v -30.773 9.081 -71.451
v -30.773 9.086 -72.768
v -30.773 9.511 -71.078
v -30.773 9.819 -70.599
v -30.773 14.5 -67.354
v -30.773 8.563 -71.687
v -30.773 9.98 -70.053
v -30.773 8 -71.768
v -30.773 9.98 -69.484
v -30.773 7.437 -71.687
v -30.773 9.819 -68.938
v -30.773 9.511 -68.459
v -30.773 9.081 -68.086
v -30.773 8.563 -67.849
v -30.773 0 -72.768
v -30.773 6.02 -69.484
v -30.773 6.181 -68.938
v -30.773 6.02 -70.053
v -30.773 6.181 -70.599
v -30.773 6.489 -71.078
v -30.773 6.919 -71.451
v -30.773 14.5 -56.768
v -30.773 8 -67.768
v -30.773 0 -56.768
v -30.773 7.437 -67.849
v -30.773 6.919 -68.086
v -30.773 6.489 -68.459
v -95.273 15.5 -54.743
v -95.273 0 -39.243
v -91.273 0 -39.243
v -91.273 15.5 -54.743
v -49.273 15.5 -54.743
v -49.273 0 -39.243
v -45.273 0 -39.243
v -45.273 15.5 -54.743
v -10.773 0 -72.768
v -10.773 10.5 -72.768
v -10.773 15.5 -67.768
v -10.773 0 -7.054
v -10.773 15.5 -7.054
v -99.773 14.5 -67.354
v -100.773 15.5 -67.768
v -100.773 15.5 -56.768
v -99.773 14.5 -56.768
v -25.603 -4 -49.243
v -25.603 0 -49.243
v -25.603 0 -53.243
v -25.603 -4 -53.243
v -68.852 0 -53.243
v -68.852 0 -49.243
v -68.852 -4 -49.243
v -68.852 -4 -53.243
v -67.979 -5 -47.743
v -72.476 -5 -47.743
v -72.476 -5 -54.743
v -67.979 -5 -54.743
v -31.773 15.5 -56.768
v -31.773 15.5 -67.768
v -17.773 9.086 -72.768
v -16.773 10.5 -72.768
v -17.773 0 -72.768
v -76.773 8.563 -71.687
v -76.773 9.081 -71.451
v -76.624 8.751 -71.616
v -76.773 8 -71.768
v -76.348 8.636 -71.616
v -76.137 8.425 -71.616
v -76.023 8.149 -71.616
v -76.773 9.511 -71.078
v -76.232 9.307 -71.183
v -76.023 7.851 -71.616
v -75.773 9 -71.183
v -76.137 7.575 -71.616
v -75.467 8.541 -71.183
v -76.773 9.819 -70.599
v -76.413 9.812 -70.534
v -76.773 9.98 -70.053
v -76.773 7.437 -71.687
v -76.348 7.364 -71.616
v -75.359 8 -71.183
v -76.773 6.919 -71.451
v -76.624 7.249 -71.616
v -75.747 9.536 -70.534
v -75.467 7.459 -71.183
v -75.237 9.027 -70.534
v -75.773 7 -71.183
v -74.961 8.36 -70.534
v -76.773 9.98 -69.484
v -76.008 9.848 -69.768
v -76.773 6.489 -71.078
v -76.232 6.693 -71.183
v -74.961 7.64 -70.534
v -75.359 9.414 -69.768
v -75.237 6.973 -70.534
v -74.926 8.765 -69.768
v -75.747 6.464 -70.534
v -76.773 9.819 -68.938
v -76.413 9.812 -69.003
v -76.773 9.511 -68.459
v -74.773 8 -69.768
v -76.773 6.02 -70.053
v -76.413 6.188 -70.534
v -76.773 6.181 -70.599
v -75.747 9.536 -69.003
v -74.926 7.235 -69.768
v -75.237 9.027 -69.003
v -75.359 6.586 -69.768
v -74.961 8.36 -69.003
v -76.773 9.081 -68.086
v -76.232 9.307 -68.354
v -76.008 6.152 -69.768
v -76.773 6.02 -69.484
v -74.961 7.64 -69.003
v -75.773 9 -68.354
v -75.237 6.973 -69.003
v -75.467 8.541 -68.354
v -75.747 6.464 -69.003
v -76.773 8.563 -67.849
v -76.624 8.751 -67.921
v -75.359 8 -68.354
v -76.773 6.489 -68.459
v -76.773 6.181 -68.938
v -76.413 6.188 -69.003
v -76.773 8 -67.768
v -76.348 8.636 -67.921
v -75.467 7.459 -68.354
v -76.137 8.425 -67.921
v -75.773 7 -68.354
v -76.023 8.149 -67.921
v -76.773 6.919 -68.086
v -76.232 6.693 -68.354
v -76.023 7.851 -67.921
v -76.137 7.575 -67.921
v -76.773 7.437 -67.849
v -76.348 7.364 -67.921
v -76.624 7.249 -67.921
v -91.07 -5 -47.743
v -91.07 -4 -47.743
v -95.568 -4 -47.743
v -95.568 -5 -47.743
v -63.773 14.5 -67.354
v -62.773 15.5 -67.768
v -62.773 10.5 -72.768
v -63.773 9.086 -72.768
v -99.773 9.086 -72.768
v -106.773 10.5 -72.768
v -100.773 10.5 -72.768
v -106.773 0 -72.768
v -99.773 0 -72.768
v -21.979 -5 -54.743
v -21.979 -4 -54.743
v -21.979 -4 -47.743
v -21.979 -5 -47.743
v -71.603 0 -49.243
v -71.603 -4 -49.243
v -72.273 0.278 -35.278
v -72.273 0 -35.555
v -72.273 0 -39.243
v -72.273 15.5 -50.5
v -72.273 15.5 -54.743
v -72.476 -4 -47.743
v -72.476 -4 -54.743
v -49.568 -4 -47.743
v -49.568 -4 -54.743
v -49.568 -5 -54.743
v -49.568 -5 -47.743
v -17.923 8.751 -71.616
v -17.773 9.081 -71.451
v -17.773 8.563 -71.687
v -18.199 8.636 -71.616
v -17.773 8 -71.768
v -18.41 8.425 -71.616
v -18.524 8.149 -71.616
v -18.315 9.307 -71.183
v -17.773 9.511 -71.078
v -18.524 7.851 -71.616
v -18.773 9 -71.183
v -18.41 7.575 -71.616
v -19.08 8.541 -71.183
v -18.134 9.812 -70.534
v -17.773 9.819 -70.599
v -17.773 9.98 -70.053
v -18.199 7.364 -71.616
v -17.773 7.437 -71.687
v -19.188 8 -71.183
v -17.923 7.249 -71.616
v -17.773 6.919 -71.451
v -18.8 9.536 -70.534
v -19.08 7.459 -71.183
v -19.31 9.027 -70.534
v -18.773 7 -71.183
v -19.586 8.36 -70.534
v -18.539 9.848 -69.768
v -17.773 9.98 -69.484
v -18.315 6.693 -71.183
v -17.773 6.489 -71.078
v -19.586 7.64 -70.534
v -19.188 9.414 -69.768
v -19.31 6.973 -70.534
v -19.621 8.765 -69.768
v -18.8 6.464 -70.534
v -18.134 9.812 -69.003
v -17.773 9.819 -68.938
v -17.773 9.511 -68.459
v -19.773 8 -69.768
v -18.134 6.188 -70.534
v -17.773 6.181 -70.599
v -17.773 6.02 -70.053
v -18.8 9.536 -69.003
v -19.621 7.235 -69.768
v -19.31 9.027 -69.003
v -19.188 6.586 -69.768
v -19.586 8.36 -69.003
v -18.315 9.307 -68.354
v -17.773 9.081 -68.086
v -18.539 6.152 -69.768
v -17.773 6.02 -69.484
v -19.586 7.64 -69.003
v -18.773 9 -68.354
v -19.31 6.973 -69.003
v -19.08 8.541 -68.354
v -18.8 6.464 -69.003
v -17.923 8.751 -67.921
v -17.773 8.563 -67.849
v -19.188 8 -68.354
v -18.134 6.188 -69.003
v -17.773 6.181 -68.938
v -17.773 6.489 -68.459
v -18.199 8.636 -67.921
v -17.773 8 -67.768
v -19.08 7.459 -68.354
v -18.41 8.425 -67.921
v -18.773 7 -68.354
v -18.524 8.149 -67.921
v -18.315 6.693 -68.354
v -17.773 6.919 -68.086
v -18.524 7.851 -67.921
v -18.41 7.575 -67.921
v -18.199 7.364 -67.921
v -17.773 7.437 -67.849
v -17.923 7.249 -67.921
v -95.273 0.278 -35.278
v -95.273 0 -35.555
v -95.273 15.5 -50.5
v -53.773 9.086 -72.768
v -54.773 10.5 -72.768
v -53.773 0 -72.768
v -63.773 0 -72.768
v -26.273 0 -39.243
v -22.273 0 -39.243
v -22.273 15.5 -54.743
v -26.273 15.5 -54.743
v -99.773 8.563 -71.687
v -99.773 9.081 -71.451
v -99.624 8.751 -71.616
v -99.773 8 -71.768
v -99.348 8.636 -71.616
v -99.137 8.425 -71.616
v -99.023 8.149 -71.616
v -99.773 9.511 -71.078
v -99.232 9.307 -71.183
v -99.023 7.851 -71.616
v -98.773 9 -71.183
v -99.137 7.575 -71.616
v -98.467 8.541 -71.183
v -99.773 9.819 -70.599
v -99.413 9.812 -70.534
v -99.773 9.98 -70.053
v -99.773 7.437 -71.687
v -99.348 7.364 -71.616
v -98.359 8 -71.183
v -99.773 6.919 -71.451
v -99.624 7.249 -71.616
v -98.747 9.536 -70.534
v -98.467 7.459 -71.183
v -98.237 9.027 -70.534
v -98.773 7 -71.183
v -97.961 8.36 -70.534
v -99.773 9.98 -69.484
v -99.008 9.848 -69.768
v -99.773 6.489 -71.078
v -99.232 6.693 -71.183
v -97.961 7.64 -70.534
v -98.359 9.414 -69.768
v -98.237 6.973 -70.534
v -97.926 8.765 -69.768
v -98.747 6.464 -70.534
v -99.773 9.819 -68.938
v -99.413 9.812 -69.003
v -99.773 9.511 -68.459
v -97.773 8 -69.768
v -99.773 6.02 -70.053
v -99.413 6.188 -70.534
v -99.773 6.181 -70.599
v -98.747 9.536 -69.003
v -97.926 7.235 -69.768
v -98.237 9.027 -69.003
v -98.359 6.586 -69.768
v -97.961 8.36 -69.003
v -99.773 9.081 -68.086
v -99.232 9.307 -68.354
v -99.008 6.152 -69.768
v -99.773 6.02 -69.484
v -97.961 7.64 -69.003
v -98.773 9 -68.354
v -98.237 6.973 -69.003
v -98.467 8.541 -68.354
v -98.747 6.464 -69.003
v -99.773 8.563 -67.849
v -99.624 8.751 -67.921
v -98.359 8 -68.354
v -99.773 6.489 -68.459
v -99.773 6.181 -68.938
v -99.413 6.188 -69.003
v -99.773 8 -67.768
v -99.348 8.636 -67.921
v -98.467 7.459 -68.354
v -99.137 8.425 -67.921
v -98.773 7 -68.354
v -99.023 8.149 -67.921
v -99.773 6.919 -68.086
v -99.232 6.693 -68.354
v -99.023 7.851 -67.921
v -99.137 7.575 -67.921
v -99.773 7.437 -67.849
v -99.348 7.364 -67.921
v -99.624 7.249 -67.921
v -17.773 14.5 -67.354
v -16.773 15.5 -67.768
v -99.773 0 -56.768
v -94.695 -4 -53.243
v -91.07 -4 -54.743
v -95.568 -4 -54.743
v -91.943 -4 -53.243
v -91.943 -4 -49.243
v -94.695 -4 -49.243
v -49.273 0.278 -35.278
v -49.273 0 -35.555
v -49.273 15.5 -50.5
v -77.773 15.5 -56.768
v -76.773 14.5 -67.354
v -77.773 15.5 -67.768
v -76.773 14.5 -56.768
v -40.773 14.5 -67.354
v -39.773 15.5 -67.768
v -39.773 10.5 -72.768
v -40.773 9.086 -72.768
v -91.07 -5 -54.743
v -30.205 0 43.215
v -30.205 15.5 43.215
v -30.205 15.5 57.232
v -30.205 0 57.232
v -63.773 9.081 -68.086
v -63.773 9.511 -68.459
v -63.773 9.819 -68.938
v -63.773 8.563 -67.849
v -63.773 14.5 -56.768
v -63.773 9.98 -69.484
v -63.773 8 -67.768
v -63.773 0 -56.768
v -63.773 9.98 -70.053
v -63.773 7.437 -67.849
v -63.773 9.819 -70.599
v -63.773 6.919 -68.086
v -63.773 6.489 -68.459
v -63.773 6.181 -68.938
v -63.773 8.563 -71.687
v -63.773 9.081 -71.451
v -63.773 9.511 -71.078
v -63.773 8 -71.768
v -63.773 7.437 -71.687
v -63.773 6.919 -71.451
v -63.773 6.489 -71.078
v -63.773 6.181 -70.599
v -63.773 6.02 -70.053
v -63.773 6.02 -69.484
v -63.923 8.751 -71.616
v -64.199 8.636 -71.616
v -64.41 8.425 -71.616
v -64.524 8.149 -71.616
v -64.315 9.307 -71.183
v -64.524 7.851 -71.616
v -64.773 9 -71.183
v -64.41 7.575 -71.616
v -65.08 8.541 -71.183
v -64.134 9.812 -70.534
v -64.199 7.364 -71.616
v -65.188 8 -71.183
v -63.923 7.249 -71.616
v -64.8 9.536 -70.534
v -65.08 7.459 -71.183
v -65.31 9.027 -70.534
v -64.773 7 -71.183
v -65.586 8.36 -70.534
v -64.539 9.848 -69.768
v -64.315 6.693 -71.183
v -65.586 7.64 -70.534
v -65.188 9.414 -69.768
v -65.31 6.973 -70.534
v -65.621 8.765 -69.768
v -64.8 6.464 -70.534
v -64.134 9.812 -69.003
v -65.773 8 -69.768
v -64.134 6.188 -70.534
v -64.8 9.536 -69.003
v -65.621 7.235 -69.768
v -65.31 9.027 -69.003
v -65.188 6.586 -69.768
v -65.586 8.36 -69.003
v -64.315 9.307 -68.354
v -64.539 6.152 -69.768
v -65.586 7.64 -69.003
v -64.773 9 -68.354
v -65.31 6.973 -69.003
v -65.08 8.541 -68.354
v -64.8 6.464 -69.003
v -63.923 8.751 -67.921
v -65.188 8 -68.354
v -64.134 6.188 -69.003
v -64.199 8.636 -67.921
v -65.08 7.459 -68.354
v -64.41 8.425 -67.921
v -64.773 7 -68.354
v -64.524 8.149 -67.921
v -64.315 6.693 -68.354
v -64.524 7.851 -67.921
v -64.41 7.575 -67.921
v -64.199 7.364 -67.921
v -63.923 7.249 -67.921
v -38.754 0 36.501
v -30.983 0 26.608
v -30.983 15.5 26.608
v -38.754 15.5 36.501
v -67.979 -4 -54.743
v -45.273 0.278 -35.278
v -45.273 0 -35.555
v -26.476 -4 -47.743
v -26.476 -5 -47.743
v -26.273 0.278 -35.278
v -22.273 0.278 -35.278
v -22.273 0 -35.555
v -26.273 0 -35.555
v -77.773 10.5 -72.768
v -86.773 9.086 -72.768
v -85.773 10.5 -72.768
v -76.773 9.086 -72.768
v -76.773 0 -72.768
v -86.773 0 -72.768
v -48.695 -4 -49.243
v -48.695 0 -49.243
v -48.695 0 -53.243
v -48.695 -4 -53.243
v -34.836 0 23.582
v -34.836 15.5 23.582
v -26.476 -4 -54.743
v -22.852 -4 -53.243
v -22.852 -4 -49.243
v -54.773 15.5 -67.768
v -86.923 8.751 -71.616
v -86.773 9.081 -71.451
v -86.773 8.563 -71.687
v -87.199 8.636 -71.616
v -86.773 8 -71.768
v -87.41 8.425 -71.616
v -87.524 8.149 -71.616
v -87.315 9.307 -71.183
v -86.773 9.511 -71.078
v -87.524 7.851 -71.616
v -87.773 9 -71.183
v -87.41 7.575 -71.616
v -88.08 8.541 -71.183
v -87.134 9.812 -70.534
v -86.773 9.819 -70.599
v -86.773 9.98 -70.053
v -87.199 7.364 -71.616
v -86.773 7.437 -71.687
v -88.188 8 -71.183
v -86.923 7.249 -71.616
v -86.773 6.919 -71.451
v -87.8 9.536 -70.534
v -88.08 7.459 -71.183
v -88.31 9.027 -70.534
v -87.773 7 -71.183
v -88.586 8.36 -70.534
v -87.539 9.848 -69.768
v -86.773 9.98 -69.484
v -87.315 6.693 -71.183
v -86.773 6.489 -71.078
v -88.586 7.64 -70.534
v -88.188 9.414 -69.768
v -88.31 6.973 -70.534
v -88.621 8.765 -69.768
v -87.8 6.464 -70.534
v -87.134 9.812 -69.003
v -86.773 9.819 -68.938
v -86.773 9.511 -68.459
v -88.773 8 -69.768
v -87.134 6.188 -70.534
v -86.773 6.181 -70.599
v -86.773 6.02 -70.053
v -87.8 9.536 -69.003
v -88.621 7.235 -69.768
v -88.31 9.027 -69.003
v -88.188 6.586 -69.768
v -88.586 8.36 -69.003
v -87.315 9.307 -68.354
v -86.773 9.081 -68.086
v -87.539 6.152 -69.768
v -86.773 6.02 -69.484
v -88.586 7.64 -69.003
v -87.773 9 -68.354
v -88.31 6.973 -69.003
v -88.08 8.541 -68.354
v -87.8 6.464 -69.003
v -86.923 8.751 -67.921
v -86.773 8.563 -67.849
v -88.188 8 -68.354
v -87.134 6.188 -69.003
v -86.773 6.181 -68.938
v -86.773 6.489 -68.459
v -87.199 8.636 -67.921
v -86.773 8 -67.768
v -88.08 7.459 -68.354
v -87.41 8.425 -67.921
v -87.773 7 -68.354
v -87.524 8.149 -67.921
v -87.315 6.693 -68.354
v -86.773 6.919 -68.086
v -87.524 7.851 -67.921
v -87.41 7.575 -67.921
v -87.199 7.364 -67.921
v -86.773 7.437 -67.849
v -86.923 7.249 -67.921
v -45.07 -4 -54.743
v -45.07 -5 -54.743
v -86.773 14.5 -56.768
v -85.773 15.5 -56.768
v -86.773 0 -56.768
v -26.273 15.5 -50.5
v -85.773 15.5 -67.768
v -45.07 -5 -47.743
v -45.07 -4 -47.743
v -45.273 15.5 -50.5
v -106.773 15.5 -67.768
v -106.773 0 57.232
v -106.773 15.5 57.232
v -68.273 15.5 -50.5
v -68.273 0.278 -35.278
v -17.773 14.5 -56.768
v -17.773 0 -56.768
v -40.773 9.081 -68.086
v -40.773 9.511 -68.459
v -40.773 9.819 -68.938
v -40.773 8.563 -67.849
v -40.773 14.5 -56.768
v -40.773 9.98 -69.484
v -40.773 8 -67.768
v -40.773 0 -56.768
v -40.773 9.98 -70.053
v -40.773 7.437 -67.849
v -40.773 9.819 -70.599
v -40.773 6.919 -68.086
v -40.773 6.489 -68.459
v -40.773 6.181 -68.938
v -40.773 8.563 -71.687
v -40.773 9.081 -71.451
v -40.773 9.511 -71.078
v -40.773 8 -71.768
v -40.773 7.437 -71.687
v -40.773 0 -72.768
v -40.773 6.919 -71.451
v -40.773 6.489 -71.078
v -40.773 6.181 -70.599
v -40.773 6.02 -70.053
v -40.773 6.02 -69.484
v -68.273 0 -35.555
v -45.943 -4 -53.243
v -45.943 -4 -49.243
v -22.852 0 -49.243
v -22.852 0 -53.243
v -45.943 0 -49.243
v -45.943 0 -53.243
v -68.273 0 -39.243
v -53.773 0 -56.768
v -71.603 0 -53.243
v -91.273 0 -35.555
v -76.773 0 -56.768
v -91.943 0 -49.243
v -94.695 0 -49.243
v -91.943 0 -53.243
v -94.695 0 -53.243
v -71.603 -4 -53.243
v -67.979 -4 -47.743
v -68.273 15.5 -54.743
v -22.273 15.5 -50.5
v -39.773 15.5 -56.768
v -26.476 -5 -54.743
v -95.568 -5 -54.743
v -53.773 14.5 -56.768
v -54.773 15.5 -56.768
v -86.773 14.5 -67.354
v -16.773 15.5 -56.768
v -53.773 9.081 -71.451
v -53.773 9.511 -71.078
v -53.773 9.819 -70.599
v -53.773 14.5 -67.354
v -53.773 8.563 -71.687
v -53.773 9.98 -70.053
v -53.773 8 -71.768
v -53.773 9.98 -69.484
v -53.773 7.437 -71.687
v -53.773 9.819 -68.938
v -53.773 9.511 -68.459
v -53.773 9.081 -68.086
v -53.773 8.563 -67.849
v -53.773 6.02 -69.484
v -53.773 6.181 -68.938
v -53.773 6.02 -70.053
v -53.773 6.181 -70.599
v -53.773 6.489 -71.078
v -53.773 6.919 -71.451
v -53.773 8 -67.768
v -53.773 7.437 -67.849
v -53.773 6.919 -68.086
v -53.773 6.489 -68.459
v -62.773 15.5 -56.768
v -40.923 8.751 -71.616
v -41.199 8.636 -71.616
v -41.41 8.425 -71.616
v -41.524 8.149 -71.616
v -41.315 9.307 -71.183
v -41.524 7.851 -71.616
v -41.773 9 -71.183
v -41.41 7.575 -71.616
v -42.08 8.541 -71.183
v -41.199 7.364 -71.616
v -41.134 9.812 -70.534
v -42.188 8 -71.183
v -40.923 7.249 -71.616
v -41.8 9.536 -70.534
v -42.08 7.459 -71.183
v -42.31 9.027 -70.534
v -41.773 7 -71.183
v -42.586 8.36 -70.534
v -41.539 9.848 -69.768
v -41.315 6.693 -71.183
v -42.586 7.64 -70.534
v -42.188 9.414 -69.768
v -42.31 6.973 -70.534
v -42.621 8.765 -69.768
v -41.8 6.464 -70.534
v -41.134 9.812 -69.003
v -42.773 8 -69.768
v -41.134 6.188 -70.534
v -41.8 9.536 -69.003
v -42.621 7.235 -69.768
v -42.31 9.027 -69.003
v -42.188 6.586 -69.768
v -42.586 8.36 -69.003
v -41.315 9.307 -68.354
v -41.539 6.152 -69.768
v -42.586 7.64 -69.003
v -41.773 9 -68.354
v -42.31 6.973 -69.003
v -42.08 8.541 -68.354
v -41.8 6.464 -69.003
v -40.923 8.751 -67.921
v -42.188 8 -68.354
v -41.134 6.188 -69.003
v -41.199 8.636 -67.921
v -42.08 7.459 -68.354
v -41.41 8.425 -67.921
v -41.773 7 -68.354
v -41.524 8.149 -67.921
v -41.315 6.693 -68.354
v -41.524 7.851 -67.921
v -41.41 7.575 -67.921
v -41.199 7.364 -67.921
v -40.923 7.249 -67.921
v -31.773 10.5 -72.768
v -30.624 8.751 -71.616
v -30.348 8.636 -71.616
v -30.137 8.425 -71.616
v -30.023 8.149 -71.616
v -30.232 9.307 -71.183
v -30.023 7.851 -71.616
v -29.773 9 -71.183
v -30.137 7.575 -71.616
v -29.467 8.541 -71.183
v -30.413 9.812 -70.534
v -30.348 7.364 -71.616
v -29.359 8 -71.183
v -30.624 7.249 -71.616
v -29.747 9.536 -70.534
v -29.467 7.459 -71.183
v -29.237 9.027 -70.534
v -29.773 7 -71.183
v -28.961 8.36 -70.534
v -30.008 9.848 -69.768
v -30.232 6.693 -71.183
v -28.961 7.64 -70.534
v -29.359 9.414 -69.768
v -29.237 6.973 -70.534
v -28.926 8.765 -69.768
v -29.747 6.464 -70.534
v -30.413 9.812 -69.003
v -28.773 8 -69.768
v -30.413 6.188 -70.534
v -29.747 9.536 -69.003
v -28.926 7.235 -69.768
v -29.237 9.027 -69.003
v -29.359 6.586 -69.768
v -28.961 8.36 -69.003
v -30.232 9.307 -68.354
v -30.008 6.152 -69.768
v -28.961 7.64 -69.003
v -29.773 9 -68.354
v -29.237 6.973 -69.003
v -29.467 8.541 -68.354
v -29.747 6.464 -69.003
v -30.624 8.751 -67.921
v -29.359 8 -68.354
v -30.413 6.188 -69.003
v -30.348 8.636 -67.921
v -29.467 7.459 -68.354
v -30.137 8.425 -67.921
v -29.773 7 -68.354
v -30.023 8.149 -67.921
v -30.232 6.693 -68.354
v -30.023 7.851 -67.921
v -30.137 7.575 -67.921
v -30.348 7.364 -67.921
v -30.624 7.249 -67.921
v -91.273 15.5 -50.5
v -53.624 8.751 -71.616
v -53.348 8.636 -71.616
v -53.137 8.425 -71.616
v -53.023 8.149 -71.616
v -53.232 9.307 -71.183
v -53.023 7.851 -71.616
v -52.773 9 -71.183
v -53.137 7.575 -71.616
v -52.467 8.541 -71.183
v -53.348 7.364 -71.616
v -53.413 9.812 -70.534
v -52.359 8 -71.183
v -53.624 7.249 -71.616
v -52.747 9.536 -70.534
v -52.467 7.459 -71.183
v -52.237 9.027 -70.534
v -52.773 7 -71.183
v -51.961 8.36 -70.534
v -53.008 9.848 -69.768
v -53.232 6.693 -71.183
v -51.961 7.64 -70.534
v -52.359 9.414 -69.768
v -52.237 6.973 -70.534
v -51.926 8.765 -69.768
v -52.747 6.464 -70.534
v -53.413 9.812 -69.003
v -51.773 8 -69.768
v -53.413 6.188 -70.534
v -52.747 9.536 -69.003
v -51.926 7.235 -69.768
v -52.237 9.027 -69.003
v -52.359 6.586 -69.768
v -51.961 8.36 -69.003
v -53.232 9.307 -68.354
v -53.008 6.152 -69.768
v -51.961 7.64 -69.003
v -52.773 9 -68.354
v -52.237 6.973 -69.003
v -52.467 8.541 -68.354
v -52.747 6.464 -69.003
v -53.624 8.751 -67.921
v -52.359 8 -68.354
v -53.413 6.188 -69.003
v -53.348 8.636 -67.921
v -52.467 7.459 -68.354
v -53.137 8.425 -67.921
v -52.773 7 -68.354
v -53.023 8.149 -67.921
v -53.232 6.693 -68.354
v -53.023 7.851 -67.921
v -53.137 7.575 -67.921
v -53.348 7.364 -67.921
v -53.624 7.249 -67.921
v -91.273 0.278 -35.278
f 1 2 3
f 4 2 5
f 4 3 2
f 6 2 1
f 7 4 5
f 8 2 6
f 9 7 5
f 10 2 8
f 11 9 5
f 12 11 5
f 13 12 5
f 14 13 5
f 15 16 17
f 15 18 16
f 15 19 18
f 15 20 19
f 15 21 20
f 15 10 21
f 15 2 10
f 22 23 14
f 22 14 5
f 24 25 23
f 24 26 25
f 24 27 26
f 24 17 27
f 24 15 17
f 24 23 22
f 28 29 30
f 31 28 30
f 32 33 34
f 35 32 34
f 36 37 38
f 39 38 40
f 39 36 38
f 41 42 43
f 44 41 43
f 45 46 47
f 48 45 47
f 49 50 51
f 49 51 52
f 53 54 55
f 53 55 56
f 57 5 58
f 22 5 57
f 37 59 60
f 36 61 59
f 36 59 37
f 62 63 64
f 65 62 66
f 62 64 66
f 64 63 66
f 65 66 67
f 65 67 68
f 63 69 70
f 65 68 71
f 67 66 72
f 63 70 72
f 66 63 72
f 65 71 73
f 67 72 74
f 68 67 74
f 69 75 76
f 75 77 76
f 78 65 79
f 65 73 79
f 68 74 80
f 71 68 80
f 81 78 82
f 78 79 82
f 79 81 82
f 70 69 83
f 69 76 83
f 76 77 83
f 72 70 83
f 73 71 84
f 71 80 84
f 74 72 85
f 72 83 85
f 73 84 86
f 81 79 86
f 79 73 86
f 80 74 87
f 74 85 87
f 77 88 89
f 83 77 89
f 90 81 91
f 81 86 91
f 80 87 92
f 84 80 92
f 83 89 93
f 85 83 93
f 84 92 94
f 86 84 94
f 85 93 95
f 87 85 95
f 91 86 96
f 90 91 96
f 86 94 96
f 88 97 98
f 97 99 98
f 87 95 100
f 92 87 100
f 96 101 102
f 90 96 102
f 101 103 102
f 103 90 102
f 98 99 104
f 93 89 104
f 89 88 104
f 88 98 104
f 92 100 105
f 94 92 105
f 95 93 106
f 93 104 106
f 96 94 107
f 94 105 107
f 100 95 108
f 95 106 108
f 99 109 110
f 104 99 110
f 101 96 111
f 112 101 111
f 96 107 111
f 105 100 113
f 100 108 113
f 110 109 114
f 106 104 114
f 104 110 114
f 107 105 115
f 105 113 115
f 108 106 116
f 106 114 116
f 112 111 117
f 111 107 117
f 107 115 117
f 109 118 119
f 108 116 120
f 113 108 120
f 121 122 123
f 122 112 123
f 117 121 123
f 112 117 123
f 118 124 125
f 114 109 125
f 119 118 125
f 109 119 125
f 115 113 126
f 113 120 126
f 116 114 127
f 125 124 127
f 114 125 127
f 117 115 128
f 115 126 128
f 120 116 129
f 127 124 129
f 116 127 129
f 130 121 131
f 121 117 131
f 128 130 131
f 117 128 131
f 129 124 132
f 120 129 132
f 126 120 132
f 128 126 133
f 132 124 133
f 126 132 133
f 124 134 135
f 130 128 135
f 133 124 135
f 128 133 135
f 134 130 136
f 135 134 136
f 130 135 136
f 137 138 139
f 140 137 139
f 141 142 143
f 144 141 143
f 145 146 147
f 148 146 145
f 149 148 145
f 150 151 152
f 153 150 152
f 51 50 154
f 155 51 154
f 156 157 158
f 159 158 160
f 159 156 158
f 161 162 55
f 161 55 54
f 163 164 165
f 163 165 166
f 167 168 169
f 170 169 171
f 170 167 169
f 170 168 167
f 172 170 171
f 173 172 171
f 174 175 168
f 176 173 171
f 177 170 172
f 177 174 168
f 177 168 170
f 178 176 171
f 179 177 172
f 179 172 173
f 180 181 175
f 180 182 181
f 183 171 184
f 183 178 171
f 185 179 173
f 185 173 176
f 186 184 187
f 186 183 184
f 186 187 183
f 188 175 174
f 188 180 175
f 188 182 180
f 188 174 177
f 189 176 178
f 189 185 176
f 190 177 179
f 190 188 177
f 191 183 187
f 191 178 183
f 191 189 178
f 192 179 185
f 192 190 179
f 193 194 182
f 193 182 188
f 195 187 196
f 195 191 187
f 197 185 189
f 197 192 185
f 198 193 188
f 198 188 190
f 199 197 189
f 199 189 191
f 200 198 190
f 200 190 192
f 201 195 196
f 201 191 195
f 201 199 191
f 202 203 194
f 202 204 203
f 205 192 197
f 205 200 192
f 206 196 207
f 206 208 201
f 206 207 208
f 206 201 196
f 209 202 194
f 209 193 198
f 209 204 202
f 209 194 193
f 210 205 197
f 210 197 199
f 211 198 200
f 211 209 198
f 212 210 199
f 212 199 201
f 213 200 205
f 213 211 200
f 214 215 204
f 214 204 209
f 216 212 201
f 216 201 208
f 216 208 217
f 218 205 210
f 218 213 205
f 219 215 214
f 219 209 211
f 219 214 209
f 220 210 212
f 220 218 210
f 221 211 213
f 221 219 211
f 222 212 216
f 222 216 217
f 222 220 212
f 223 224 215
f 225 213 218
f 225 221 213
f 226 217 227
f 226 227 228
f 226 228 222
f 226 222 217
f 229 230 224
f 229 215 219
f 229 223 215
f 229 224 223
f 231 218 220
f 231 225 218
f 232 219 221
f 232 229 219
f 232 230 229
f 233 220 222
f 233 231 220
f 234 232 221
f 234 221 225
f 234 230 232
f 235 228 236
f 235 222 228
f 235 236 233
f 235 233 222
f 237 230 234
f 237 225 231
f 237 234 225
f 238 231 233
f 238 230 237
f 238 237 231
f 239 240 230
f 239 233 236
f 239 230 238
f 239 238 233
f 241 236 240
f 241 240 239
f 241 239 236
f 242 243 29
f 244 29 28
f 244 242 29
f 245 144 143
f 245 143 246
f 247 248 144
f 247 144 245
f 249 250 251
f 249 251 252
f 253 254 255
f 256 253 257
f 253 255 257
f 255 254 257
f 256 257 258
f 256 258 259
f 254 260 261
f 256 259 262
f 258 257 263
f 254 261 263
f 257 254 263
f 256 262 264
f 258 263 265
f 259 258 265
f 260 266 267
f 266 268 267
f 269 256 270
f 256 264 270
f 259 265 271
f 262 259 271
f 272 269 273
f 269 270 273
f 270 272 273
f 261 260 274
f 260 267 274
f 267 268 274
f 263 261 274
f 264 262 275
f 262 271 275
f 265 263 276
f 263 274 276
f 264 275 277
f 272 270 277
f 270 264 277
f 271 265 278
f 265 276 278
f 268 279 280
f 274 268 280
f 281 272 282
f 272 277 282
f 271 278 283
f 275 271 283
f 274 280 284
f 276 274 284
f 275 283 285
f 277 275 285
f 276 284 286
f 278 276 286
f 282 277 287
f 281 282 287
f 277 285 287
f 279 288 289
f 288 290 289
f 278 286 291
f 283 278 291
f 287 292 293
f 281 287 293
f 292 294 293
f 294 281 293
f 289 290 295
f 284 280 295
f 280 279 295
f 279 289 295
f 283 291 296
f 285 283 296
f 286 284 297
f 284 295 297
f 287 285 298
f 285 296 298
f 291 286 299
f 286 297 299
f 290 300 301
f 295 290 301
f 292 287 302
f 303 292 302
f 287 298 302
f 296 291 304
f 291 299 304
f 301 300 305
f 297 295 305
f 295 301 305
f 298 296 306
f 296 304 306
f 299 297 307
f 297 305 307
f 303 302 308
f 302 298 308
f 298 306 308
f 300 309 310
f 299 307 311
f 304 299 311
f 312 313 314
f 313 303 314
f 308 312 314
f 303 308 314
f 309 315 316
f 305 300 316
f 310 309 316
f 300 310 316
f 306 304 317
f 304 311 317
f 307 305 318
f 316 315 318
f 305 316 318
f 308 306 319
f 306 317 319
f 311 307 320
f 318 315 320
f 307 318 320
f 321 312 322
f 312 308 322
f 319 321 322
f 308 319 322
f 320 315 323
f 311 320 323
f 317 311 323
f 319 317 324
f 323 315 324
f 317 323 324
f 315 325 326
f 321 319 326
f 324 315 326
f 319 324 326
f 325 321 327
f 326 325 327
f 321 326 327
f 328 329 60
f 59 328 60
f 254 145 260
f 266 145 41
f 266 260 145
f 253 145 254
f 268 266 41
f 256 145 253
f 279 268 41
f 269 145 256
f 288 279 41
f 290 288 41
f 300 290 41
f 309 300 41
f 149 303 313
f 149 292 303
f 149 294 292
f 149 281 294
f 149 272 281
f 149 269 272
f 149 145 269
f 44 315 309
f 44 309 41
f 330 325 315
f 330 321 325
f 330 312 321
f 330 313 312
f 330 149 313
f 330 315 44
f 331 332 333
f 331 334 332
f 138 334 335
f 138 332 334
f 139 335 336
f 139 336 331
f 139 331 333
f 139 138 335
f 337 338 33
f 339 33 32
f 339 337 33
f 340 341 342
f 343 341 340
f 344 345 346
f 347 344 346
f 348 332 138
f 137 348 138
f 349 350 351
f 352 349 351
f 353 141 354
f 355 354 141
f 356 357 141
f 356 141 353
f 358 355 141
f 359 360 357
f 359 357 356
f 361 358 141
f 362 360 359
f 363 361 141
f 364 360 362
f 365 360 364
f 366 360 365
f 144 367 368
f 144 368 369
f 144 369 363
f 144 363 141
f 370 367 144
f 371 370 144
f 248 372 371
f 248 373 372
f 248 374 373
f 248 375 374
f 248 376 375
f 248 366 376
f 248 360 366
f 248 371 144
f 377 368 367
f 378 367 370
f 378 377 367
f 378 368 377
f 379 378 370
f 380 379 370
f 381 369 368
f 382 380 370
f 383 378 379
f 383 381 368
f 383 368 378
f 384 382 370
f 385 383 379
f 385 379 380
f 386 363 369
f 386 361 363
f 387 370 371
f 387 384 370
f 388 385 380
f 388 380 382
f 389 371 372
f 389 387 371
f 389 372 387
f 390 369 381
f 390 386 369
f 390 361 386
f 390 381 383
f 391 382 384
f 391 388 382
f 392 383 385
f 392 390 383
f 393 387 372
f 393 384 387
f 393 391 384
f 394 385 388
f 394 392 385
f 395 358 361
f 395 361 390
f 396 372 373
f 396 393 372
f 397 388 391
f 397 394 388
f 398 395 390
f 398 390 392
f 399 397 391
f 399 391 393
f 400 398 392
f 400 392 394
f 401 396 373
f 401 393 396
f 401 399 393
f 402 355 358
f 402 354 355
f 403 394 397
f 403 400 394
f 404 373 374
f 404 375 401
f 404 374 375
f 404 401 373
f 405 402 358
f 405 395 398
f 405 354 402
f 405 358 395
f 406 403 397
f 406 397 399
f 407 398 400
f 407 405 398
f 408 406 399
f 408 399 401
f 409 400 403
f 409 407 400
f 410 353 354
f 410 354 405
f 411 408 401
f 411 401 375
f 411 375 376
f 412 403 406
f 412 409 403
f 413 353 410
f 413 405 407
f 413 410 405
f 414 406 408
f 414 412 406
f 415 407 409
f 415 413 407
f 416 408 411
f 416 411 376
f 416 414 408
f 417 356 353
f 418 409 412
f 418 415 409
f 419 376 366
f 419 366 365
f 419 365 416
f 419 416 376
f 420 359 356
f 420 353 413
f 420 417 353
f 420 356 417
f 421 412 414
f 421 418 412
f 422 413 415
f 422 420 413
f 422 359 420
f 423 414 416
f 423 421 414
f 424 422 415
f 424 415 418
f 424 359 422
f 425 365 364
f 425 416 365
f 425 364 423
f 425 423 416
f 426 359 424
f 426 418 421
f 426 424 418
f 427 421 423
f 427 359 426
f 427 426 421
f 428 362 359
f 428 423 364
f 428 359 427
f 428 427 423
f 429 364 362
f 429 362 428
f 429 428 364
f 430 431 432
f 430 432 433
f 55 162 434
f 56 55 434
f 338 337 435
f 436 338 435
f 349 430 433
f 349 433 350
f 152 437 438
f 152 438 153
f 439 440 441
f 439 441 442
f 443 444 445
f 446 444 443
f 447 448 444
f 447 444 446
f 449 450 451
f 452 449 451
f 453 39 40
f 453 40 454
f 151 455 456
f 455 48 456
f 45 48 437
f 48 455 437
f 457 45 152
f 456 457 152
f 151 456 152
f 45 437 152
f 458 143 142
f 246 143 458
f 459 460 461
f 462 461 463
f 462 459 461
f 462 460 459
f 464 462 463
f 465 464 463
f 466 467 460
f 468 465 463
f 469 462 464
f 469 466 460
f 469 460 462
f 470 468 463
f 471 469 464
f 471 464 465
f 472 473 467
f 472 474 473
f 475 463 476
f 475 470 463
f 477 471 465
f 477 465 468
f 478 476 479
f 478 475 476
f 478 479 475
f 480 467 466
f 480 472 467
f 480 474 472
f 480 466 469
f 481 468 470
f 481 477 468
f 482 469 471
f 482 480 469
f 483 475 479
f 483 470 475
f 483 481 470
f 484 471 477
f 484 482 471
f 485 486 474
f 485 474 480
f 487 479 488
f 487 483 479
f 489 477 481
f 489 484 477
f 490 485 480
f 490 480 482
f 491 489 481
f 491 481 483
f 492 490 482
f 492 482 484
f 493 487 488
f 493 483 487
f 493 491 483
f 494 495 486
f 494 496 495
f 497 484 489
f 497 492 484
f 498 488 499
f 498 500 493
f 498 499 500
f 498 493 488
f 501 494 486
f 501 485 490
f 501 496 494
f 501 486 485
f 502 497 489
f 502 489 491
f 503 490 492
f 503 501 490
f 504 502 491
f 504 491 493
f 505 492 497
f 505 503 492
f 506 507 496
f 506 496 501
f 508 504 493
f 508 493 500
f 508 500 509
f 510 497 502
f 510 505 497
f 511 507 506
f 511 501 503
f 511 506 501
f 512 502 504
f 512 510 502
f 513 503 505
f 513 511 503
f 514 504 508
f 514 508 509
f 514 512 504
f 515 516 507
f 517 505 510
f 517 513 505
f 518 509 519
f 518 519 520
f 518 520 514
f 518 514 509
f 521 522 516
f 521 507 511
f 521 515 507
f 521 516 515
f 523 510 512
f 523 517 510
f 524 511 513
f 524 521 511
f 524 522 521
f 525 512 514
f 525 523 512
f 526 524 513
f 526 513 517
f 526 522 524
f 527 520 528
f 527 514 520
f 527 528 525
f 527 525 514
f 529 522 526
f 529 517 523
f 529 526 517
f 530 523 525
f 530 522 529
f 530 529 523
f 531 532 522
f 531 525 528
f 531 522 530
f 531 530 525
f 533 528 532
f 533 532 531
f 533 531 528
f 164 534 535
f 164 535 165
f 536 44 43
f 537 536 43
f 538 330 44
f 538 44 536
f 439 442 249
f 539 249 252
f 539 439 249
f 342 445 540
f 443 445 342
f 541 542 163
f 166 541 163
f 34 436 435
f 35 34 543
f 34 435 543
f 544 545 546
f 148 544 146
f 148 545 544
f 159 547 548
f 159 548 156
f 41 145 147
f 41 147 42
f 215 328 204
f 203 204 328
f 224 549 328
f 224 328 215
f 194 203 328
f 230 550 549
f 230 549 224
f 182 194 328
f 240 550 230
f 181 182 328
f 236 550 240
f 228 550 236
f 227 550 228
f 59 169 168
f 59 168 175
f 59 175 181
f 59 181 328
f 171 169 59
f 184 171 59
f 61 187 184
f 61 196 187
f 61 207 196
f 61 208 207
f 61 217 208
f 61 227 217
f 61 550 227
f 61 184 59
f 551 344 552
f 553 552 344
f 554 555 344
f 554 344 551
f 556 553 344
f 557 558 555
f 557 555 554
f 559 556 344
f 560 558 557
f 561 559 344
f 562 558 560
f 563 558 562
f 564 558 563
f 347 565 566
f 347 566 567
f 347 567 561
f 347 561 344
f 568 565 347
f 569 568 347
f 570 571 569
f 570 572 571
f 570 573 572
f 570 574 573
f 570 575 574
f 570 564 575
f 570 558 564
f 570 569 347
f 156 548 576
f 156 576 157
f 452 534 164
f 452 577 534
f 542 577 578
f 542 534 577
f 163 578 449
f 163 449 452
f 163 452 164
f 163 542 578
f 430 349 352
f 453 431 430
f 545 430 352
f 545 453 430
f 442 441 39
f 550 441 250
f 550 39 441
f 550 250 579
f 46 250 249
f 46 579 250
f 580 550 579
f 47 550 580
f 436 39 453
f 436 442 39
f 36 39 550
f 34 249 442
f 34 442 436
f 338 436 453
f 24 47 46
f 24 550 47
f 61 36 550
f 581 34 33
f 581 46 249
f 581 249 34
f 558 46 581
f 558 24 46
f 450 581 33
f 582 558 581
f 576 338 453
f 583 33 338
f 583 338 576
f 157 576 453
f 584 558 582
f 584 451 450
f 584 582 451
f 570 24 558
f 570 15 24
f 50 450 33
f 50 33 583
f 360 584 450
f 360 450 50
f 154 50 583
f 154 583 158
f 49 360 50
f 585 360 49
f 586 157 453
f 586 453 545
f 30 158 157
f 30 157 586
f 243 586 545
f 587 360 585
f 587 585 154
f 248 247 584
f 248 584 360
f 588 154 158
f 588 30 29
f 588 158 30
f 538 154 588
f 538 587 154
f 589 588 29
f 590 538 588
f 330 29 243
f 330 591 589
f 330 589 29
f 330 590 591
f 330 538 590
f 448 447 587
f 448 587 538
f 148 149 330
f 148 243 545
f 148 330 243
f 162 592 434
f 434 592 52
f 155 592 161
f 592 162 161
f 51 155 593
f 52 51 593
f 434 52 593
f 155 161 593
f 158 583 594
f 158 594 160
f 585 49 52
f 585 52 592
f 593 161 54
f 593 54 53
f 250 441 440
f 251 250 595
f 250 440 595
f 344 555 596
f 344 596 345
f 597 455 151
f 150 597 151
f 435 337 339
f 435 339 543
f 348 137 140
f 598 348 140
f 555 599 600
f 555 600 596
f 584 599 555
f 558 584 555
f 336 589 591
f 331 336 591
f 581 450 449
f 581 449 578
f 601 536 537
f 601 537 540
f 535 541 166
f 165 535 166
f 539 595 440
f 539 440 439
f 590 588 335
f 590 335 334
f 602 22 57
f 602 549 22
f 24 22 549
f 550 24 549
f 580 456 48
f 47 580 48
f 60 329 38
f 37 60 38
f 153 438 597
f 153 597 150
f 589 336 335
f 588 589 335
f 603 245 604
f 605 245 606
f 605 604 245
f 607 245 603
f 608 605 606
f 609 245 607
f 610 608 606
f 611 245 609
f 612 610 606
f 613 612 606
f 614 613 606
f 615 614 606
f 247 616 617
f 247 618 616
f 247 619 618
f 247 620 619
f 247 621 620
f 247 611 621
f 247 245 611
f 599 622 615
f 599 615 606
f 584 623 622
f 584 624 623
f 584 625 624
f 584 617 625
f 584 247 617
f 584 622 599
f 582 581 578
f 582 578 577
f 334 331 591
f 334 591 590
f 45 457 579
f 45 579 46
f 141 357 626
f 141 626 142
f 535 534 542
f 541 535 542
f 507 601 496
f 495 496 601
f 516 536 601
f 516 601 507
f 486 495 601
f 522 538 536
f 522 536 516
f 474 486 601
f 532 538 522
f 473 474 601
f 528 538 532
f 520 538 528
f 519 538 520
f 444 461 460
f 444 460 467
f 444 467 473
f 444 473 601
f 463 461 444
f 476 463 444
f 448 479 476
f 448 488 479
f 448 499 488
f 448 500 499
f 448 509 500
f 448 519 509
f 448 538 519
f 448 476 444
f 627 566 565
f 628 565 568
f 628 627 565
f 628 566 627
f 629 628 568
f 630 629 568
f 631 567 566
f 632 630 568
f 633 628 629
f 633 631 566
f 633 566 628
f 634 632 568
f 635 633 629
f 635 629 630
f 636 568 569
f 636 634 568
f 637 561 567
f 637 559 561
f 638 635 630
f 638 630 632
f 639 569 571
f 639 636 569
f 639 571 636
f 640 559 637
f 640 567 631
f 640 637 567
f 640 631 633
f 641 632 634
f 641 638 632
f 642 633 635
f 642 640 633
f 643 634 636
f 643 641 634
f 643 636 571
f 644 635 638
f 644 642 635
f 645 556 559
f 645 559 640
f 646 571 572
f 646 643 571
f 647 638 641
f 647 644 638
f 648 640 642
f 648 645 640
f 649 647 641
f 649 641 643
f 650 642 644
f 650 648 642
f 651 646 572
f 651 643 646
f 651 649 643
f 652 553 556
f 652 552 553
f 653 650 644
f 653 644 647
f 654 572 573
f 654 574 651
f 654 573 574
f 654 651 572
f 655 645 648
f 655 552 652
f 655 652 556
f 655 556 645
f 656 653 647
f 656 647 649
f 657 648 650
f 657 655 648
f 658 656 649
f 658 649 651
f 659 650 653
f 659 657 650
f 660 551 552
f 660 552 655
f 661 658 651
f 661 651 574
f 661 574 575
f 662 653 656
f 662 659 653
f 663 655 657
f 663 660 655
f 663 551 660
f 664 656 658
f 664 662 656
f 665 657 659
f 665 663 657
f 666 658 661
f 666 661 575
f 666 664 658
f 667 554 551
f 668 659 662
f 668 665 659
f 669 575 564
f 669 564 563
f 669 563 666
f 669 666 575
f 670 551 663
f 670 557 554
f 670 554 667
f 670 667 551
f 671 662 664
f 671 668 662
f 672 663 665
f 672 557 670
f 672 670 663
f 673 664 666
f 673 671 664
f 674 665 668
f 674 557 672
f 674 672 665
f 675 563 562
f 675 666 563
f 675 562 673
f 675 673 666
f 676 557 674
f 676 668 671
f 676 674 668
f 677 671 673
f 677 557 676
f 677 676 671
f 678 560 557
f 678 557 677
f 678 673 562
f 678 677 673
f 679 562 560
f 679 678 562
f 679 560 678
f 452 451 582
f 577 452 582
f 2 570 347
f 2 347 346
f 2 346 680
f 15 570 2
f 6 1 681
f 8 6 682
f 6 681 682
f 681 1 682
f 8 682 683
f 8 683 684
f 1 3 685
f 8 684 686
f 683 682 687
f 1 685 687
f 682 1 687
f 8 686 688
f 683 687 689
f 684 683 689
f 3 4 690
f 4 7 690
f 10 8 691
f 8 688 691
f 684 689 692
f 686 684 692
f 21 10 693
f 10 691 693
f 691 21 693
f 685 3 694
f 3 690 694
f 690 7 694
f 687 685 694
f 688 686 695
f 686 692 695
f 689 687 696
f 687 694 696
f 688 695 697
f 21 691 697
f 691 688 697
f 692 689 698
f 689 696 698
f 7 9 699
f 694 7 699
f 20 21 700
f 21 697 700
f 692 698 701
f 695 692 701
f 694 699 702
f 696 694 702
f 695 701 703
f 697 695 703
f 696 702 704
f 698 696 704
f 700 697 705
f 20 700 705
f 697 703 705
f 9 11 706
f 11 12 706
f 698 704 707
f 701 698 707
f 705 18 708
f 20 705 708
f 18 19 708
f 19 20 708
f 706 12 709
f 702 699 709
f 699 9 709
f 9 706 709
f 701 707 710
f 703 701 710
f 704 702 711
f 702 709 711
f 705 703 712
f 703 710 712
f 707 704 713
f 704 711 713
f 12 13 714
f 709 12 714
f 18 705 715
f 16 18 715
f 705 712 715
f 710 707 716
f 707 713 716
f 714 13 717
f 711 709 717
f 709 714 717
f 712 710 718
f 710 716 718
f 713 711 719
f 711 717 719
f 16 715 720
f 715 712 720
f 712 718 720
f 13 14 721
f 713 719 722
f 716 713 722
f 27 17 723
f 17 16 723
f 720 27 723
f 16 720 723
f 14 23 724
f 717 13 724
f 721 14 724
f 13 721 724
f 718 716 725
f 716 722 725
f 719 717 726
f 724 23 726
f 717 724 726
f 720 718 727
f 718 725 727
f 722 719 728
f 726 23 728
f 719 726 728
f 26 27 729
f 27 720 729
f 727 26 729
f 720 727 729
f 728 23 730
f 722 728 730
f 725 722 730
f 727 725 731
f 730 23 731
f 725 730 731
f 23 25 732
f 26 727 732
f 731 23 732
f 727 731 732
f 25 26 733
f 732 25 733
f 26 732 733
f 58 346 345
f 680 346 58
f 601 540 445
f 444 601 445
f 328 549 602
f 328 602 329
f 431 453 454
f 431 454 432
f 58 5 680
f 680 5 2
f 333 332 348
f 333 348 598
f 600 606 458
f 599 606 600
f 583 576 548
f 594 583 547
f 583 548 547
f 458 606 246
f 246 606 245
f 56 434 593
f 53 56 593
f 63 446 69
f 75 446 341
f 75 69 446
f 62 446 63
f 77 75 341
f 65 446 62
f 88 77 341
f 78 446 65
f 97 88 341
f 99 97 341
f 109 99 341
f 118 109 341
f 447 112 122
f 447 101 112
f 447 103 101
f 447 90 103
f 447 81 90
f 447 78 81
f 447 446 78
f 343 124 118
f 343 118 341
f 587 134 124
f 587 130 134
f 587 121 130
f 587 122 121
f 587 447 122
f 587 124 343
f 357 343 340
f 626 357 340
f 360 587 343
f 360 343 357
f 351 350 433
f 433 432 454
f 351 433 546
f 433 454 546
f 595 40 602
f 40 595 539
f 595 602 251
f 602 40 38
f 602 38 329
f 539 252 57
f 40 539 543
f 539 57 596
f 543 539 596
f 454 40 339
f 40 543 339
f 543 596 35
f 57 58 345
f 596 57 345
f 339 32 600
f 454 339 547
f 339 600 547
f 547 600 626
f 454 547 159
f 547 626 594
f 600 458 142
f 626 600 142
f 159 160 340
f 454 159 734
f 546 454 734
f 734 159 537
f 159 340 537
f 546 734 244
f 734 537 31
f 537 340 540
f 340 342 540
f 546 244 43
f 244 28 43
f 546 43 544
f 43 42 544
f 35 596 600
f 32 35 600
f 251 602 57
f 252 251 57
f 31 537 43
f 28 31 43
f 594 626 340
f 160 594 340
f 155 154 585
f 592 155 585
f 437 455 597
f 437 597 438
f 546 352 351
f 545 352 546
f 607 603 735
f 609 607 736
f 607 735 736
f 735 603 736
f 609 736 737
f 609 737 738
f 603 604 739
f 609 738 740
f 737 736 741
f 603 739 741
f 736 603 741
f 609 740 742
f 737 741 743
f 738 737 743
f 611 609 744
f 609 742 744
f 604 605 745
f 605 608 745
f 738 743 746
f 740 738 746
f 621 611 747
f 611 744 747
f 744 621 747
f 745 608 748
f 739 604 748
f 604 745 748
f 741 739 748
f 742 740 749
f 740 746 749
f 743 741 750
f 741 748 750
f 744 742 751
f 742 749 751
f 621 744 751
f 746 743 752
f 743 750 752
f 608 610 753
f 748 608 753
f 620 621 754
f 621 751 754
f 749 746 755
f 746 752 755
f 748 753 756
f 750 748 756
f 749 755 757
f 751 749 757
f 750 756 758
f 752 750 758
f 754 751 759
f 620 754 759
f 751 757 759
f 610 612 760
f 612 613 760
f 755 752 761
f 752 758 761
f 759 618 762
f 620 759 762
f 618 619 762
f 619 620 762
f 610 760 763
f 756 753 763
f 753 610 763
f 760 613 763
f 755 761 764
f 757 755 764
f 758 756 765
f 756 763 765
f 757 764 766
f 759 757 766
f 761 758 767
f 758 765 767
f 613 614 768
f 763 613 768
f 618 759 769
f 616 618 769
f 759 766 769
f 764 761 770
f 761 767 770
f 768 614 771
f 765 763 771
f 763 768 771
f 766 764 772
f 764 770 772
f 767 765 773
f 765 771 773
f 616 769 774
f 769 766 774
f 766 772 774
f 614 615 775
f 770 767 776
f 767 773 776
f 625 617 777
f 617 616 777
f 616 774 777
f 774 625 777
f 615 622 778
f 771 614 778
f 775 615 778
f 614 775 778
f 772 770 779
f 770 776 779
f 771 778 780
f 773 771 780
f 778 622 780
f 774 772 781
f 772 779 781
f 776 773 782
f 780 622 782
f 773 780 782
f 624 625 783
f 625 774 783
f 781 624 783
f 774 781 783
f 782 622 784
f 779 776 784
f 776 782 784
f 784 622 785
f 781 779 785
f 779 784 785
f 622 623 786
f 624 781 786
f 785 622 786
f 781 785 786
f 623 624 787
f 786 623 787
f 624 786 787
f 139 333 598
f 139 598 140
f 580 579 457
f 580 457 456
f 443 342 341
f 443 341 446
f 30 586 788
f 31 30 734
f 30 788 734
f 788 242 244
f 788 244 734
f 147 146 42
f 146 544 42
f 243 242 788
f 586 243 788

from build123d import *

# Parameters (mm, degrees)
BOSS_EXTRUDE1_DEPTH     = 15.5
SKETCH10_W              = 4
SKETCH10_H              = 30
CUT_EXTRUDE1_DEPTH      = 3
MIRROR5_COPY_1_SKETCH_W = 4
MIRROR5_COPY_1_SKETCH_H = 30
MIRROR5_COPY_1_DEPTH    = 3
SKETCH14_W              = 2.751713212
SKETCH14_H              = 4
BOSS_EXTRUDE2_DEPTH     = 4
SKETCH15_W              = 4.497862048
SKETCH15_H              = 7
BOSS_EXTRUDE3_DEPTH     = 1
MIRROR7_COPY_1_SKETCH_W = 2.751713212
MIRROR7_COPY_1_SKETCH_H = 4
MIRROR7_COPY_1_DEPTH    = 4
MIRROR7_COPY_2_SKETCH_W = 4.497862048
MIRROR7_COPY_2_SKETCH_H = 7
MIRROR7_COPY_2_DEPTH    = 1
CHAMFER9_SIZE           = 5
CHAMFER10_SIZE          = 1
CHAMFER15_SIZE          = 5
CHAMFER16_SIZE          = 1
CHAMFER17_SIZE          = 1
CHAMFER18_SIZE          = 5
CHAMFER19_SIZE          = 1


with BuildPart() as part:
    # Sketch1 → Boss-Extrude1 (new body)
    with BuildSketch(Plane(origin=(0, 0, 0), x_dir=(1, 0, 0), z_dir=(0, 1, 0))):
        Polygon((-106.77339112, 72.768445428), (-99.77339112, 72.768445428), (-99.77339112, 56.768445428), (-86.77339112, 56.768445428), (-86.77339112, 72.768445428), (-76.77339112, 72.768445428), (-76.77339112, 56.768445428), (-63.77339112, 56.768445428), (-63.77339112, 72.768445428), (-53.77339112, 72.768445428), (-53.77339112, 56.768445428), (-40.77339112, 56.768445428), (-40.77339112, 72.768445428), (-30.77339112, 72.768445428), (-30.77339112, 56.768445428), (-17.77339112, 56.768445428), (-17.77339112, 72.768445428), (-10.77339112, 72.768445428), (-10.77339112, 7.054306764), (-34.835725148, -23.581828326), (-30.98324076, -26.60765929), (-38.753655744, -36.500942414), (-30.205167067, -43.215124519), (-30.205167067, -57.231554572), (-106.77339112, -57.231554572), align=None)
    extrude(amount=BOSS_EXTRUDE1_DEPTH)

    # Sketch4 → Revolve1 (revolve)
    with BuildSketch(Plane(origin=(-99.77339112, 0, 0), x_dir=(0, 0, -1), z_dir=(1, 0, 0))):
        with BuildLine():
            Line((67.768445428, 8), (71.768445428, 8))
            ThreePointArc((71.768445428, 8), (69.768445428, 10), (67.768445428, 8))
        make_face()
    revolve1 = revolve(axis=Axis((-99.77339112, 8, -67.768445428), (0, 0, -1)))

    # Mirror1: Revolve1 across plane
    add(revolve1.mirror(Plane(origin=(-93.27339112, 0, 0), x_dir=(0, 0, 1), z_dir=(1, 0, 0))))

    # Mirror2: Revolve1 across plane
    add(revolve1.mirror(Plane(origin=(-81.77339112, 0, 0), x_dir=(0, 0, 1), z_dir=(1, 0, 0))))

    # Mirror2 copy 1 sketch → Mirror2 copy 1 (revolve)
    with BuildSketch(Plane(origin=(-76.77339112, 0, 0), x_dir=(0, 0, -1), z_dir=(1, 0, 0))):
        with BuildLine():
            Line((67.768445428, 8), (71.768445428, 8))
            ThreePointArc((71.768445428, 8), (69.768445428, 10), (67.768445428, 8))
        make_face()
    revolve(axis=Axis((-76.77339112, 8, -67.768445428), (0, 0, -1)))

    # Mirror3: Revolve1 across plane
    add(revolve1.mirror(Plane(origin=(-58.77339112, 0, 0), x_dir=(0, 0, 1), z_dir=(1, 0, 0))))

    # Mirror3 copy 1 sketch → Mirror3 copy 1 (revolve)
    with BuildSketch(Plane(origin=(-53.77339112, 0, 0), x_dir=(0, 0, -1), z_dir=(1, 0, 0))):
        with BuildLine():
            Line((67.768445428, 8), (71.768445428, 8))
            ThreePointArc((71.768445428, 8), (69.768445428, 10), (67.768445428, 8))
        make_face()
    revolve(axis=Axis((-53.77339112, 8, -67.768445428), (0, 0, -1)))

    # Mirror3 copy 2 sketch → Mirror3 copy 2 (revolve)
    with BuildSketch(Plane(origin=(-40.77339112, 0, 0), x_dir=(0, 0, -1), z_dir=(-1, 0, 0))):
        with BuildLine():
            Line((67.768445428, -8), (71.768445428, -8))
            ThreePointArc((71.768445428, -8), (69.768445428, -10), (67.768445428, -8))
        make_face()
    revolve(axis=Axis((-40.77339112, 8, -67.768445428), (0, 0, 1)))

    # Mirror3 copy 3 sketch → Mirror3 copy 3 (revolve)
    with BuildSketch(Plane(origin=(-30.77339112, 0, 0), x_dir=(0, 0, -1), z_dir=(1, 0, 0))):
        with BuildLine():
            Line((67.768445428, 8), (71.768445428, 8))
            ThreePointArc((71.768445428, 8), (69.768445428, 10), (67.768445428, 8))
        make_face()
    revolve(axis=Axis((-30.77339112, 8, -67.768445428), (0, 0, -1)))

    # Sketch10 → Cut-Extrude1 (cut)
    with BuildSketch(Plane(origin=(0, -17.5, -17.5), x_dir=(-1, 0, 0), z_dir=(0, -0.707106781, -0.707106781))):
        with Locations((24.27339112, 40.141352719)):
            Rectangle(SKETCH10_W, SKETCH10_H)
    cut_extrude1 = extrude(amount=CUT_EXTRUDE1_DEPTH, mode=Mode.SUBTRACT)

    # Mirror4: Cut-Extrude1 across plane
    add(cut_extrude1.mirror(Plane(origin=(-35.77339112, 0, 0), x_dir=(0, 0, 1), z_dir=(1, 0, 0))), mode=Mode.SUBTRACT)

    # Mirror5: Cut-Extrude1 across plane
    add(cut_extrude1.mirror(Plane(origin=(-58.77339112, 0, 0), x_dir=(0, 0, 1), z_dir=(1, 0, 0))), mode=Mode.SUBTRACT)

    # Mirror5 copy 1 sketch → Mirror5 copy 1 (cut)
    with BuildSketch(Plane(origin=(-46, -17.5, -17.5), x_dir=(-1, 0, 0), z_dir=(0, -0.707106781, -0.707106781))):
        with Locations((24.27339112, 40.141352719)):
            Rectangle(MIRROR5_COPY_1_SKETCH_W, MIRROR5_COPY_1_SKETCH_H)
    extrude(amount=MIRROR5_COPY_1_DEPTH, mode=Mode.SUBTRACT)

    # Sketch14 → Boss-Extrude2 (add)
    with BuildSketch(Plane(origin=(0, 0, 0), x_dir=(-1, 0, 0), z_dir=(0, -1, 0))):
        with Locations((24.227451545, 51.242640687)):
            Rectangle(SKETCH14_W, SKETCH14_H)
    boss_extrude2 = extrude(amount=BOSS_EXTRUDE2_DEPTH)

    # Sketch15 → Boss-Extrude3 (add)
    with BuildSketch(Plane.XZ.offset(4)):
        with Locations((-24.227451545, -51.242640687)):
            Rectangle(SKETCH15_W, SKETCH15_H)
    boss_extrude3 = extrude(amount=BOSS_EXTRUDE3_DEPTH)

    # Mirror6: Boss-Extrude2, Boss-Extrude3 across plane
    add(boss_extrude2.mirror(Plane(origin=(-35.77339112, 0, 0), x_dir=(0, 0, 1), z_dir=(1, 0, 0))))
    add(boss_extrude3.mirror(Plane(origin=(-35.77339112, 0, 0), x_dir=(0, 0, 1), z_dir=(1, 0, 0))))

    # Mirror7: Boss-Extrude2, Boss-Extrude3 across plane
    add(boss_extrude2.mirror(Plane(origin=(-58.77339112, 0, 0), x_dir=(0, 0, 1), z_dir=(1, 0, 0))))
    add(boss_extrude3.mirror(Plane(origin=(-58.77339112, 0, 0), x_dir=(0, 0, 1), z_dir=(1, 0, 0))))

    # Mirror7 copy 1 sketch → Mirror7 copy 1 (add)
    with BuildSketch(Plane(origin=(-46, 0, 0), x_dir=(-1, 0, 0), z_dir=(0, -1, 0))):
        with Locations((24.227451545, 51.242640687)):
            Rectangle(MIRROR7_COPY_1_SKETCH_W, MIRROR7_COPY_1_SKETCH_H)
    extrude(amount=MIRROR7_COPY_1_DEPTH)

    # Mirror7 copy 2 sketch → Mirror7 copy 2 (add)
    with BuildSketch(Plane(origin=(-46, -4, 0), x_dir=(1, 0, 0), z_dir=(0, -1, 0))):
        with Locations((-24.227451545, -51.242640687)):
            Rectangle(MIRROR7_COPY_2_SKETCH_W, MIRROR7_COPY_2_SKETCH_H)
    extrude(amount=MIRROR7_COPY_2_DEPTH)

    # Chamfer9
    chamfer9_edges = [part.edges().sort_by_distance(p)[0] for p in [
        (-103.27339112, 15.5, -72.768445428),
    ]]
    chamfer(chamfer9_edges, length=CHAMFER9_SIZE)

    # Chamfer10
    chamfer10_edges = [part.edges().sort_by_distance(p)[0] for p in [
        (-99.77339112, 15.5, -62.268445428),
        (-99.77339112, 13, -70.268445428),
    ]]
    chamfer(chamfer10_edges, length=CHAMFER10_SIZE)

    # Chamfer15
    chamfer15_edges = [part.edges().sort_by_distance(p)[0] for p in [
        (-81.77339112, 15.5, -72.768445428),
    ]]
    chamfer(chamfer15_edges, length=CHAMFER15_SIZE)

    # Chamfer16
    chamfer16_edges = [part.edges().sort_by_distance(p)[0] for p in [
        (-86.77339112, 13, -70.268445428),
        (-86.77339112, 15.5, -62.268445428),
    ]]
    chamfer(chamfer16_edges, length=CHAMFER16_SIZE)

    # Chamfer17
    chamfer17_edges = [part.edges().sort_by_distance(p)[0] for p in [
        (-76.77339112, 15.5, -62.268445428),
        (-76.77339112, 13, -70.268445428),
    ]]
    chamfer(chamfer17_edges, length=CHAMFER17_SIZE)

    # Chamfer18
    chamfer18_edges = [part.edges().sort_by_distance(p)[0] for p in [
        (-14.27339112, 15.5, -72.768445428),
        (-35.77339112, 15.5, -72.768445428),
        (-58.77339112, 15.5, -72.768445428),
    ]]
    chamfer(chamfer18_edges, length=CHAMFER18_SIZE)

    # Chamfer19
    chamfer19_edges = [part.edges().sort_by_distance(p)[0] for p in [
        (-17.77339112, 15.5, -62.268445428),
        (-40.77339112, 15.5, -62.268445428),
        (-30.77339112, 15.5, -62.268445428),
        (-53.77339112, 15.5, -62.268445428),
        (-17.77339112, 13, -70.268445428),
        (-30.77339112, 13, -70.268445428),
        (-40.77339112, 13, -70.268445428),
        (-53.77339112, 13, -70.268445428),
        (-63.77339112, 13, -70.268445428),
        (-63.77339112, 15.5, -62.268445428),
    ]]
    chamfer(chamfer19_edges, length=CHAMFER19_SIZE)


solid = part.part
